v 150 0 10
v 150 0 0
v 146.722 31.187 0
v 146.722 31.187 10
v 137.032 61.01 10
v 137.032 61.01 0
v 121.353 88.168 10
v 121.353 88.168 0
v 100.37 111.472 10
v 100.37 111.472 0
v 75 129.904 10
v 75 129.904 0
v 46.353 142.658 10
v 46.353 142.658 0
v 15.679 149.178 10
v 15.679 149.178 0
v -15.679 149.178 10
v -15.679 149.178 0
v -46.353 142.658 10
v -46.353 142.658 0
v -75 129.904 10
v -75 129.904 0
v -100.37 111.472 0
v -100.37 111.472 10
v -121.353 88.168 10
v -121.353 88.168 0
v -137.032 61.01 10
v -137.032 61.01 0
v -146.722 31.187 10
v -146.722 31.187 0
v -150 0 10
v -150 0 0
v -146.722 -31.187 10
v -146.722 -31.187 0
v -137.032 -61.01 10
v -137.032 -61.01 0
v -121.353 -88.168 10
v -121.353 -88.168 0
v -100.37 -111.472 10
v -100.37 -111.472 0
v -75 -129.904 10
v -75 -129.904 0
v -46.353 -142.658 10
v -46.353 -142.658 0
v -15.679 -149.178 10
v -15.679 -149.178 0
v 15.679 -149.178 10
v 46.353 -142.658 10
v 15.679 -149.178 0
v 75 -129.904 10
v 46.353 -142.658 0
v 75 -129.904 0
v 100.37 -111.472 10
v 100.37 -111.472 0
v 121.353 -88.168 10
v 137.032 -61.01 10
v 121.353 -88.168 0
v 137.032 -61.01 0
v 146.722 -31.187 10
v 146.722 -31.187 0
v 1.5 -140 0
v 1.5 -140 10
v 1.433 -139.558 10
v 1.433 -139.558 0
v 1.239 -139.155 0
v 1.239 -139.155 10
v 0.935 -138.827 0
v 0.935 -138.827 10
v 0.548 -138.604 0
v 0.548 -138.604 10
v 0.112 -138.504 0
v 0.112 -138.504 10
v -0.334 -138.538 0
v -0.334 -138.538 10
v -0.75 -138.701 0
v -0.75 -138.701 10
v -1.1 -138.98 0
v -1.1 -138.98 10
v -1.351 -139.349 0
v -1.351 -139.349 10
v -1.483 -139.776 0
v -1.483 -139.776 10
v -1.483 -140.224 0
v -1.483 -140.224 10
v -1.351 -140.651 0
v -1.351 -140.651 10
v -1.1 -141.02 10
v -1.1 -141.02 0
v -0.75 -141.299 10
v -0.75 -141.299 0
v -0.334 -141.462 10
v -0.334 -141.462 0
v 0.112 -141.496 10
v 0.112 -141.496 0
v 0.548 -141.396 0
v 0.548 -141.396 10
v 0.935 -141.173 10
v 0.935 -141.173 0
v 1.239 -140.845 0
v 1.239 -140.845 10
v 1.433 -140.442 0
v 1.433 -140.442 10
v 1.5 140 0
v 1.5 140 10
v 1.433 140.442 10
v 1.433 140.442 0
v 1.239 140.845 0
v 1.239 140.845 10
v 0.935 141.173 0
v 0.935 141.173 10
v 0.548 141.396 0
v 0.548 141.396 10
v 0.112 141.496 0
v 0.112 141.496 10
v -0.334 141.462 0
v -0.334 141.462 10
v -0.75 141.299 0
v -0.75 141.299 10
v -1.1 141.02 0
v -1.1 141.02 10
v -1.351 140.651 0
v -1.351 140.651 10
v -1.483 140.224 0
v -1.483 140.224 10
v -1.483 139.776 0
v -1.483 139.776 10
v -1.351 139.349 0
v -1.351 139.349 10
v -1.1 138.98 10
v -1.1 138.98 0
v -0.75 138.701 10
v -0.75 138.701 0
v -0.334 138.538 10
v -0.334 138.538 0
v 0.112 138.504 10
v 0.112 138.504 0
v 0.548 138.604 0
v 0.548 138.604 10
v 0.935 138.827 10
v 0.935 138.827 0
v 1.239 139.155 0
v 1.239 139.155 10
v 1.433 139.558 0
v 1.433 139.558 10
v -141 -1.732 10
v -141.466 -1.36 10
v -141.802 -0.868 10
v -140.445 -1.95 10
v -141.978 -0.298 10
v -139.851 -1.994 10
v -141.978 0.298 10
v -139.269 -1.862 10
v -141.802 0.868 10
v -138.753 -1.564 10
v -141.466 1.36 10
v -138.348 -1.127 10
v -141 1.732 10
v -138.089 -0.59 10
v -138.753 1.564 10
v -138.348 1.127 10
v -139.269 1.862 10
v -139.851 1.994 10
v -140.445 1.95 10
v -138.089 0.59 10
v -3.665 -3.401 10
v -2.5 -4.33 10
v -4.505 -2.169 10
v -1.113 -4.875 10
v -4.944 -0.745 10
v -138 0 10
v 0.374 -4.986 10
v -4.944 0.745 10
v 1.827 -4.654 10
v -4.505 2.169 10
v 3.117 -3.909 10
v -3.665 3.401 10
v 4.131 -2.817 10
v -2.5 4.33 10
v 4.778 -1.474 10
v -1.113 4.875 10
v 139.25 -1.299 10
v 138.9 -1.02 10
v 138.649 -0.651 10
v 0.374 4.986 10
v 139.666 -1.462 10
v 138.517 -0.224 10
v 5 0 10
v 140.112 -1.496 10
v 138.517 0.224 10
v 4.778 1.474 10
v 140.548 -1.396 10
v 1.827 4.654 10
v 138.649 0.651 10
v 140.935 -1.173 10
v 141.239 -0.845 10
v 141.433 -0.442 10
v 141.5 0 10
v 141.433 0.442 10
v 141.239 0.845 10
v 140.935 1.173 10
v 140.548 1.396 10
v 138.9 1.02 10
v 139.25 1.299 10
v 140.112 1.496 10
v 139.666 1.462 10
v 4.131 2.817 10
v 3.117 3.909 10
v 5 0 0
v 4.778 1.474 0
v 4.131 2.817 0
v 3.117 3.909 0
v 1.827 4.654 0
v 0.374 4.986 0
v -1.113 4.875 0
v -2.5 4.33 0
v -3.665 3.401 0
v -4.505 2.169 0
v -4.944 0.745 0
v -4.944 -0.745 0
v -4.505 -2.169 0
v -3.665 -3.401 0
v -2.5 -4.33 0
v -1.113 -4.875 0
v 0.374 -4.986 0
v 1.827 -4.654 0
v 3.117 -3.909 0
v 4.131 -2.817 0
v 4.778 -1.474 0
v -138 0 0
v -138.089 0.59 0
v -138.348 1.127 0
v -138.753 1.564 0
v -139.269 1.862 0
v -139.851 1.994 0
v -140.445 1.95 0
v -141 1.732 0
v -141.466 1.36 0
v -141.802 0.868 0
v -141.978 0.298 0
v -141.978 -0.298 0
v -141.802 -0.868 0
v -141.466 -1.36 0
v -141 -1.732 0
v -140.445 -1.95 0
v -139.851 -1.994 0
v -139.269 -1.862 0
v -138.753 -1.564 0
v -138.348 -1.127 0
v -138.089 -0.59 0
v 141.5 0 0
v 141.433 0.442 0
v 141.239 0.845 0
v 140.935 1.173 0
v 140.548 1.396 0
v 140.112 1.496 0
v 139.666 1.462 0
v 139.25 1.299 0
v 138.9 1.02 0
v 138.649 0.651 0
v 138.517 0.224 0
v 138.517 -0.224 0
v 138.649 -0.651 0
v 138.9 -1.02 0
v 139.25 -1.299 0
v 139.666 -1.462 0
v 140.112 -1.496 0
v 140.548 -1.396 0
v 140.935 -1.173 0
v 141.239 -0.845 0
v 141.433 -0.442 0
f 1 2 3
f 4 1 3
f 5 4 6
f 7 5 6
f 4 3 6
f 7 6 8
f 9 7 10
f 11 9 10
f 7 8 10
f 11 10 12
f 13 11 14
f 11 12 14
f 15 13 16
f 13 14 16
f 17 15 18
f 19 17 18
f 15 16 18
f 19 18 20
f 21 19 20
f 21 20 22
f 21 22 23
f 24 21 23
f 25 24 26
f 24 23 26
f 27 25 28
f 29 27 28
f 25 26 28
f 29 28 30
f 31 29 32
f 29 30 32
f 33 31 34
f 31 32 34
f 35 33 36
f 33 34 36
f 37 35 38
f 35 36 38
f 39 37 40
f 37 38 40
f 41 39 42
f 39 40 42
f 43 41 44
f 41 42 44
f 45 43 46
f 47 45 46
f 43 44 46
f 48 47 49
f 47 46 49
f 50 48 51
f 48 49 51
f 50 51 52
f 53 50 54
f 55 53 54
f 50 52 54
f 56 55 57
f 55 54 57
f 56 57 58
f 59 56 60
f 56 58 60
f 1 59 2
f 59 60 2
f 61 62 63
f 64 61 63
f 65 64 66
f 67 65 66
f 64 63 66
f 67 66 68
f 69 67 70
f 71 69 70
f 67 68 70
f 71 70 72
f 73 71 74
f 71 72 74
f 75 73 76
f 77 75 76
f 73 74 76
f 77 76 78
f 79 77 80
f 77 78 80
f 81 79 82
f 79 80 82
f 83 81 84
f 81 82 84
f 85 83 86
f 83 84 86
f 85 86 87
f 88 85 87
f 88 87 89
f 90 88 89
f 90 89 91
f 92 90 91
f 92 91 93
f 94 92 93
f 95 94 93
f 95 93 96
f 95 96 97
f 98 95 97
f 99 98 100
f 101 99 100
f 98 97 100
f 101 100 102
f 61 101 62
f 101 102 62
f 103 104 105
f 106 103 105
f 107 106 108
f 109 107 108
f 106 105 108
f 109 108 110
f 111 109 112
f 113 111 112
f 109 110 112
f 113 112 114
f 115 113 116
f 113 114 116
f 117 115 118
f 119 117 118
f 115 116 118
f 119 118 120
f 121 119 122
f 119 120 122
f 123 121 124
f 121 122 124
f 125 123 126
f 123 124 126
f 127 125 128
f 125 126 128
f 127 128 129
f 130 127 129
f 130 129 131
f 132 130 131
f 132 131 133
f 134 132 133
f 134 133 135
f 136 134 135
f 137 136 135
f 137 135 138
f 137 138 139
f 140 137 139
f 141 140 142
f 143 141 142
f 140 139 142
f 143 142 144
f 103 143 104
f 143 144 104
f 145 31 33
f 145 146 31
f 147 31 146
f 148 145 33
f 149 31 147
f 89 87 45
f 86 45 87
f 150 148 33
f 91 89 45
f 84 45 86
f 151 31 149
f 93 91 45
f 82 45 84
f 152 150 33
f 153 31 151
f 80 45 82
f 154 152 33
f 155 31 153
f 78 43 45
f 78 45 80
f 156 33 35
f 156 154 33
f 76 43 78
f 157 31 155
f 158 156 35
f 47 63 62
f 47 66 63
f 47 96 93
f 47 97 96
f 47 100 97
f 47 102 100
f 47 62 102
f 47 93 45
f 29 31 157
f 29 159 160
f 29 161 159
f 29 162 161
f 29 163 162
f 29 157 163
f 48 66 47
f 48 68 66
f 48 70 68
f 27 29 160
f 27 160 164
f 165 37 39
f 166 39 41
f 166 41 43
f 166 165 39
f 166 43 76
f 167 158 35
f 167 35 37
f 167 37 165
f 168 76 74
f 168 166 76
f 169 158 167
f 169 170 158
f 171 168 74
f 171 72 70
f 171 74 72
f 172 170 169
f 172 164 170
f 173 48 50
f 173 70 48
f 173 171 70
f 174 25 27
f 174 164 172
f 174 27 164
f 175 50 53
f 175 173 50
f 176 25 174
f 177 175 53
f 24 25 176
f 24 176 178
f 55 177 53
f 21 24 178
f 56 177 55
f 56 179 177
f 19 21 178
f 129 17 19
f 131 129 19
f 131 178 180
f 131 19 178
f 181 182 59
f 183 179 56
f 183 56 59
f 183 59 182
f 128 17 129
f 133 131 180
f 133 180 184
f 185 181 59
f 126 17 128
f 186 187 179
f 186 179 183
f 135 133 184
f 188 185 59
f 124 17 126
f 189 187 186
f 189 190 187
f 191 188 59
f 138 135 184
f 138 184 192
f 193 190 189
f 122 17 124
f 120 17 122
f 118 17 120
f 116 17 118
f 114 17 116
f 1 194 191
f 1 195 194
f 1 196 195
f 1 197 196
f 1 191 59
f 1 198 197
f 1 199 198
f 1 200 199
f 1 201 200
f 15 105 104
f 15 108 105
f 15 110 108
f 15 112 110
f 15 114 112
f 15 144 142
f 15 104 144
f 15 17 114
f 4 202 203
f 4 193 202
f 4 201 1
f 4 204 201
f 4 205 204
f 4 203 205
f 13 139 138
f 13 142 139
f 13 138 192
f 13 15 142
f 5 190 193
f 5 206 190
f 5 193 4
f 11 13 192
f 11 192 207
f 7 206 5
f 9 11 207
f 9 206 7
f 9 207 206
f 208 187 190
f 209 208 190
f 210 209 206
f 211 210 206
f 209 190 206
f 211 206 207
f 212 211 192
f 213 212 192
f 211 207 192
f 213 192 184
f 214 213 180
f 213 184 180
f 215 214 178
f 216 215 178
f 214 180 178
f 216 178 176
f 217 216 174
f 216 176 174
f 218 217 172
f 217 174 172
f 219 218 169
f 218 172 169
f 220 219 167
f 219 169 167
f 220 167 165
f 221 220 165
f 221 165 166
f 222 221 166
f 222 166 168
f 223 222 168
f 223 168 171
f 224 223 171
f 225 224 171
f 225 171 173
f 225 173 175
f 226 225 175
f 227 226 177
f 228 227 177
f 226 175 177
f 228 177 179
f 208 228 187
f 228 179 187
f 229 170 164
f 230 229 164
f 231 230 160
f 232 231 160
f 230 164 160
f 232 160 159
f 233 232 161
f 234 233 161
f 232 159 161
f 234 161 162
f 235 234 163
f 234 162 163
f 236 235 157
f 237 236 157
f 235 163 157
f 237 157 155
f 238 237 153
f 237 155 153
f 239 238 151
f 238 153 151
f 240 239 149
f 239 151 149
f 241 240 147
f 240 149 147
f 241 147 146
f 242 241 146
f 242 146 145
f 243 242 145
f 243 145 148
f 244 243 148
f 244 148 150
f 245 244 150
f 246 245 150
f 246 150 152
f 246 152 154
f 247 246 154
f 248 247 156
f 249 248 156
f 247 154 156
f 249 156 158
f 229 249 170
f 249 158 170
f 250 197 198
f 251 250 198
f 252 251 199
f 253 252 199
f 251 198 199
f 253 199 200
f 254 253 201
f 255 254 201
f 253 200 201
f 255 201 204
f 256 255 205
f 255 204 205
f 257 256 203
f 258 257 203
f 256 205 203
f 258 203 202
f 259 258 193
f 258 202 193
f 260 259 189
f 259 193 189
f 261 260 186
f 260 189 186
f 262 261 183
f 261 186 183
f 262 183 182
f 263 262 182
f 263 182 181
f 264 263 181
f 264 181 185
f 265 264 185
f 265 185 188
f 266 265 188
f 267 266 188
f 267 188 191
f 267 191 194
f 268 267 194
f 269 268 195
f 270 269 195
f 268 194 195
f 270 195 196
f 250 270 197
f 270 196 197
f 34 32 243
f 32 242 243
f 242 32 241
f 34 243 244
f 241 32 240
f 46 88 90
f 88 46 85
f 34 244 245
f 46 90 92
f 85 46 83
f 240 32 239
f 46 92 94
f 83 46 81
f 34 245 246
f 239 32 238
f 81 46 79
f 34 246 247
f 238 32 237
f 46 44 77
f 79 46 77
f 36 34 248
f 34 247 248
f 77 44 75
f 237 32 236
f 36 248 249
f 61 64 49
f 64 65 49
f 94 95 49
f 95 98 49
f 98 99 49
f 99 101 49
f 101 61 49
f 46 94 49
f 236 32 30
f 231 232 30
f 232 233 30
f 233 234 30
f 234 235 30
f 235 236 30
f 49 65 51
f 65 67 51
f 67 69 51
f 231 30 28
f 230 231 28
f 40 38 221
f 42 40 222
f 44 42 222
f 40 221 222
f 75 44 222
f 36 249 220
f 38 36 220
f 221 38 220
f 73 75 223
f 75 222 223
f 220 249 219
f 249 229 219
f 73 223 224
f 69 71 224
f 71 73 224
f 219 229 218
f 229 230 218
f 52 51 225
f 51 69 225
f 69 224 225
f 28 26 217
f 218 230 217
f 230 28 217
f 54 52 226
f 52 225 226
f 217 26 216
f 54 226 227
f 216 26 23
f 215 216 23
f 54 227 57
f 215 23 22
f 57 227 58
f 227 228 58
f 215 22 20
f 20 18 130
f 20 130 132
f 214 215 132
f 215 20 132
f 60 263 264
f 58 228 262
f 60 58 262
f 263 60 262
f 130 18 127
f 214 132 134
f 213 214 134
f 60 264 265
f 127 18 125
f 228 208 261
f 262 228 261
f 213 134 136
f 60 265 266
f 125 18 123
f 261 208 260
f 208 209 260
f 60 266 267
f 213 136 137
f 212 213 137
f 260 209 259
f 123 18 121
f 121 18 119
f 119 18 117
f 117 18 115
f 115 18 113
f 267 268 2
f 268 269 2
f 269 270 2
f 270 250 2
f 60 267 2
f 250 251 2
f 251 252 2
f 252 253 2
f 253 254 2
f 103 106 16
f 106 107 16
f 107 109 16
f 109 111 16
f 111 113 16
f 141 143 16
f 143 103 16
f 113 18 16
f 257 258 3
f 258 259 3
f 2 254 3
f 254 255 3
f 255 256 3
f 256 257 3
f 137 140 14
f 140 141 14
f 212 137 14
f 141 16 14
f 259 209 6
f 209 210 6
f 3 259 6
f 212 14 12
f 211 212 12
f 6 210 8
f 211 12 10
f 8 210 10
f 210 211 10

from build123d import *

# Parameters (mm, degrees)
SKETCH1_R           = 150
BOSS_EXTRUDE1_DEPTH = 10
SKETCH3_R           = 1.5
CUT_EXTRUDE1_DEPTH  = 10
SKETCH5_R           = 1.5
SKETCH5_R_2         = 2
CUT_EXTRUDE2_DEPTH  = 10
SKETCH6_R           = 5
CUT_EXTRUDE8_DEPTH  = 10


with BuildPart() as part:
    # Sketch1 → Boss-Extrude1 (new body)
    with BuildSketch(Plane.XY):
        Circle(SKETCH1_R)
    extrude(amount=BOSS_EXTRUDE1_DEPTH)

    # Sketch3 → Cut-Extrude1 (cut)
    with BuildSketch(Plane.XY.offset(10)):
        with Locations((0, 140)):
            Circle(SKETCH3_R)
    extrude(amount=-CUT_EXTRUDE1_DEPTH, mode=Mode.SUBTRACT)

    # Sketch5 → Cut-Extrude2 (cut)
    with BuildSketch(Plane.XY.offset(10)):
        with Locations((0, -140)):
            Circle(SKETCH5_R)
        with Locations((-140, 0)):
            Circle(SKETCH5_R_2)
        with Locations((140, 0)):
            Circle(SKETCH5_R)
    extrude(amount=-CUT_EXTRUDE2_DEPTH, mode=Mode.SUBTRACT)

    # Sketch6 → Cut-Extrude8 (cut)
    with BuildSketch(Plane.XY.offset(10)):
        Circle(SKETCH6_R)
    extrude(amount=-CUT_EXTRUDE8_DEPTH, mode=Mode.SUBTRACT)


solid = part.part
